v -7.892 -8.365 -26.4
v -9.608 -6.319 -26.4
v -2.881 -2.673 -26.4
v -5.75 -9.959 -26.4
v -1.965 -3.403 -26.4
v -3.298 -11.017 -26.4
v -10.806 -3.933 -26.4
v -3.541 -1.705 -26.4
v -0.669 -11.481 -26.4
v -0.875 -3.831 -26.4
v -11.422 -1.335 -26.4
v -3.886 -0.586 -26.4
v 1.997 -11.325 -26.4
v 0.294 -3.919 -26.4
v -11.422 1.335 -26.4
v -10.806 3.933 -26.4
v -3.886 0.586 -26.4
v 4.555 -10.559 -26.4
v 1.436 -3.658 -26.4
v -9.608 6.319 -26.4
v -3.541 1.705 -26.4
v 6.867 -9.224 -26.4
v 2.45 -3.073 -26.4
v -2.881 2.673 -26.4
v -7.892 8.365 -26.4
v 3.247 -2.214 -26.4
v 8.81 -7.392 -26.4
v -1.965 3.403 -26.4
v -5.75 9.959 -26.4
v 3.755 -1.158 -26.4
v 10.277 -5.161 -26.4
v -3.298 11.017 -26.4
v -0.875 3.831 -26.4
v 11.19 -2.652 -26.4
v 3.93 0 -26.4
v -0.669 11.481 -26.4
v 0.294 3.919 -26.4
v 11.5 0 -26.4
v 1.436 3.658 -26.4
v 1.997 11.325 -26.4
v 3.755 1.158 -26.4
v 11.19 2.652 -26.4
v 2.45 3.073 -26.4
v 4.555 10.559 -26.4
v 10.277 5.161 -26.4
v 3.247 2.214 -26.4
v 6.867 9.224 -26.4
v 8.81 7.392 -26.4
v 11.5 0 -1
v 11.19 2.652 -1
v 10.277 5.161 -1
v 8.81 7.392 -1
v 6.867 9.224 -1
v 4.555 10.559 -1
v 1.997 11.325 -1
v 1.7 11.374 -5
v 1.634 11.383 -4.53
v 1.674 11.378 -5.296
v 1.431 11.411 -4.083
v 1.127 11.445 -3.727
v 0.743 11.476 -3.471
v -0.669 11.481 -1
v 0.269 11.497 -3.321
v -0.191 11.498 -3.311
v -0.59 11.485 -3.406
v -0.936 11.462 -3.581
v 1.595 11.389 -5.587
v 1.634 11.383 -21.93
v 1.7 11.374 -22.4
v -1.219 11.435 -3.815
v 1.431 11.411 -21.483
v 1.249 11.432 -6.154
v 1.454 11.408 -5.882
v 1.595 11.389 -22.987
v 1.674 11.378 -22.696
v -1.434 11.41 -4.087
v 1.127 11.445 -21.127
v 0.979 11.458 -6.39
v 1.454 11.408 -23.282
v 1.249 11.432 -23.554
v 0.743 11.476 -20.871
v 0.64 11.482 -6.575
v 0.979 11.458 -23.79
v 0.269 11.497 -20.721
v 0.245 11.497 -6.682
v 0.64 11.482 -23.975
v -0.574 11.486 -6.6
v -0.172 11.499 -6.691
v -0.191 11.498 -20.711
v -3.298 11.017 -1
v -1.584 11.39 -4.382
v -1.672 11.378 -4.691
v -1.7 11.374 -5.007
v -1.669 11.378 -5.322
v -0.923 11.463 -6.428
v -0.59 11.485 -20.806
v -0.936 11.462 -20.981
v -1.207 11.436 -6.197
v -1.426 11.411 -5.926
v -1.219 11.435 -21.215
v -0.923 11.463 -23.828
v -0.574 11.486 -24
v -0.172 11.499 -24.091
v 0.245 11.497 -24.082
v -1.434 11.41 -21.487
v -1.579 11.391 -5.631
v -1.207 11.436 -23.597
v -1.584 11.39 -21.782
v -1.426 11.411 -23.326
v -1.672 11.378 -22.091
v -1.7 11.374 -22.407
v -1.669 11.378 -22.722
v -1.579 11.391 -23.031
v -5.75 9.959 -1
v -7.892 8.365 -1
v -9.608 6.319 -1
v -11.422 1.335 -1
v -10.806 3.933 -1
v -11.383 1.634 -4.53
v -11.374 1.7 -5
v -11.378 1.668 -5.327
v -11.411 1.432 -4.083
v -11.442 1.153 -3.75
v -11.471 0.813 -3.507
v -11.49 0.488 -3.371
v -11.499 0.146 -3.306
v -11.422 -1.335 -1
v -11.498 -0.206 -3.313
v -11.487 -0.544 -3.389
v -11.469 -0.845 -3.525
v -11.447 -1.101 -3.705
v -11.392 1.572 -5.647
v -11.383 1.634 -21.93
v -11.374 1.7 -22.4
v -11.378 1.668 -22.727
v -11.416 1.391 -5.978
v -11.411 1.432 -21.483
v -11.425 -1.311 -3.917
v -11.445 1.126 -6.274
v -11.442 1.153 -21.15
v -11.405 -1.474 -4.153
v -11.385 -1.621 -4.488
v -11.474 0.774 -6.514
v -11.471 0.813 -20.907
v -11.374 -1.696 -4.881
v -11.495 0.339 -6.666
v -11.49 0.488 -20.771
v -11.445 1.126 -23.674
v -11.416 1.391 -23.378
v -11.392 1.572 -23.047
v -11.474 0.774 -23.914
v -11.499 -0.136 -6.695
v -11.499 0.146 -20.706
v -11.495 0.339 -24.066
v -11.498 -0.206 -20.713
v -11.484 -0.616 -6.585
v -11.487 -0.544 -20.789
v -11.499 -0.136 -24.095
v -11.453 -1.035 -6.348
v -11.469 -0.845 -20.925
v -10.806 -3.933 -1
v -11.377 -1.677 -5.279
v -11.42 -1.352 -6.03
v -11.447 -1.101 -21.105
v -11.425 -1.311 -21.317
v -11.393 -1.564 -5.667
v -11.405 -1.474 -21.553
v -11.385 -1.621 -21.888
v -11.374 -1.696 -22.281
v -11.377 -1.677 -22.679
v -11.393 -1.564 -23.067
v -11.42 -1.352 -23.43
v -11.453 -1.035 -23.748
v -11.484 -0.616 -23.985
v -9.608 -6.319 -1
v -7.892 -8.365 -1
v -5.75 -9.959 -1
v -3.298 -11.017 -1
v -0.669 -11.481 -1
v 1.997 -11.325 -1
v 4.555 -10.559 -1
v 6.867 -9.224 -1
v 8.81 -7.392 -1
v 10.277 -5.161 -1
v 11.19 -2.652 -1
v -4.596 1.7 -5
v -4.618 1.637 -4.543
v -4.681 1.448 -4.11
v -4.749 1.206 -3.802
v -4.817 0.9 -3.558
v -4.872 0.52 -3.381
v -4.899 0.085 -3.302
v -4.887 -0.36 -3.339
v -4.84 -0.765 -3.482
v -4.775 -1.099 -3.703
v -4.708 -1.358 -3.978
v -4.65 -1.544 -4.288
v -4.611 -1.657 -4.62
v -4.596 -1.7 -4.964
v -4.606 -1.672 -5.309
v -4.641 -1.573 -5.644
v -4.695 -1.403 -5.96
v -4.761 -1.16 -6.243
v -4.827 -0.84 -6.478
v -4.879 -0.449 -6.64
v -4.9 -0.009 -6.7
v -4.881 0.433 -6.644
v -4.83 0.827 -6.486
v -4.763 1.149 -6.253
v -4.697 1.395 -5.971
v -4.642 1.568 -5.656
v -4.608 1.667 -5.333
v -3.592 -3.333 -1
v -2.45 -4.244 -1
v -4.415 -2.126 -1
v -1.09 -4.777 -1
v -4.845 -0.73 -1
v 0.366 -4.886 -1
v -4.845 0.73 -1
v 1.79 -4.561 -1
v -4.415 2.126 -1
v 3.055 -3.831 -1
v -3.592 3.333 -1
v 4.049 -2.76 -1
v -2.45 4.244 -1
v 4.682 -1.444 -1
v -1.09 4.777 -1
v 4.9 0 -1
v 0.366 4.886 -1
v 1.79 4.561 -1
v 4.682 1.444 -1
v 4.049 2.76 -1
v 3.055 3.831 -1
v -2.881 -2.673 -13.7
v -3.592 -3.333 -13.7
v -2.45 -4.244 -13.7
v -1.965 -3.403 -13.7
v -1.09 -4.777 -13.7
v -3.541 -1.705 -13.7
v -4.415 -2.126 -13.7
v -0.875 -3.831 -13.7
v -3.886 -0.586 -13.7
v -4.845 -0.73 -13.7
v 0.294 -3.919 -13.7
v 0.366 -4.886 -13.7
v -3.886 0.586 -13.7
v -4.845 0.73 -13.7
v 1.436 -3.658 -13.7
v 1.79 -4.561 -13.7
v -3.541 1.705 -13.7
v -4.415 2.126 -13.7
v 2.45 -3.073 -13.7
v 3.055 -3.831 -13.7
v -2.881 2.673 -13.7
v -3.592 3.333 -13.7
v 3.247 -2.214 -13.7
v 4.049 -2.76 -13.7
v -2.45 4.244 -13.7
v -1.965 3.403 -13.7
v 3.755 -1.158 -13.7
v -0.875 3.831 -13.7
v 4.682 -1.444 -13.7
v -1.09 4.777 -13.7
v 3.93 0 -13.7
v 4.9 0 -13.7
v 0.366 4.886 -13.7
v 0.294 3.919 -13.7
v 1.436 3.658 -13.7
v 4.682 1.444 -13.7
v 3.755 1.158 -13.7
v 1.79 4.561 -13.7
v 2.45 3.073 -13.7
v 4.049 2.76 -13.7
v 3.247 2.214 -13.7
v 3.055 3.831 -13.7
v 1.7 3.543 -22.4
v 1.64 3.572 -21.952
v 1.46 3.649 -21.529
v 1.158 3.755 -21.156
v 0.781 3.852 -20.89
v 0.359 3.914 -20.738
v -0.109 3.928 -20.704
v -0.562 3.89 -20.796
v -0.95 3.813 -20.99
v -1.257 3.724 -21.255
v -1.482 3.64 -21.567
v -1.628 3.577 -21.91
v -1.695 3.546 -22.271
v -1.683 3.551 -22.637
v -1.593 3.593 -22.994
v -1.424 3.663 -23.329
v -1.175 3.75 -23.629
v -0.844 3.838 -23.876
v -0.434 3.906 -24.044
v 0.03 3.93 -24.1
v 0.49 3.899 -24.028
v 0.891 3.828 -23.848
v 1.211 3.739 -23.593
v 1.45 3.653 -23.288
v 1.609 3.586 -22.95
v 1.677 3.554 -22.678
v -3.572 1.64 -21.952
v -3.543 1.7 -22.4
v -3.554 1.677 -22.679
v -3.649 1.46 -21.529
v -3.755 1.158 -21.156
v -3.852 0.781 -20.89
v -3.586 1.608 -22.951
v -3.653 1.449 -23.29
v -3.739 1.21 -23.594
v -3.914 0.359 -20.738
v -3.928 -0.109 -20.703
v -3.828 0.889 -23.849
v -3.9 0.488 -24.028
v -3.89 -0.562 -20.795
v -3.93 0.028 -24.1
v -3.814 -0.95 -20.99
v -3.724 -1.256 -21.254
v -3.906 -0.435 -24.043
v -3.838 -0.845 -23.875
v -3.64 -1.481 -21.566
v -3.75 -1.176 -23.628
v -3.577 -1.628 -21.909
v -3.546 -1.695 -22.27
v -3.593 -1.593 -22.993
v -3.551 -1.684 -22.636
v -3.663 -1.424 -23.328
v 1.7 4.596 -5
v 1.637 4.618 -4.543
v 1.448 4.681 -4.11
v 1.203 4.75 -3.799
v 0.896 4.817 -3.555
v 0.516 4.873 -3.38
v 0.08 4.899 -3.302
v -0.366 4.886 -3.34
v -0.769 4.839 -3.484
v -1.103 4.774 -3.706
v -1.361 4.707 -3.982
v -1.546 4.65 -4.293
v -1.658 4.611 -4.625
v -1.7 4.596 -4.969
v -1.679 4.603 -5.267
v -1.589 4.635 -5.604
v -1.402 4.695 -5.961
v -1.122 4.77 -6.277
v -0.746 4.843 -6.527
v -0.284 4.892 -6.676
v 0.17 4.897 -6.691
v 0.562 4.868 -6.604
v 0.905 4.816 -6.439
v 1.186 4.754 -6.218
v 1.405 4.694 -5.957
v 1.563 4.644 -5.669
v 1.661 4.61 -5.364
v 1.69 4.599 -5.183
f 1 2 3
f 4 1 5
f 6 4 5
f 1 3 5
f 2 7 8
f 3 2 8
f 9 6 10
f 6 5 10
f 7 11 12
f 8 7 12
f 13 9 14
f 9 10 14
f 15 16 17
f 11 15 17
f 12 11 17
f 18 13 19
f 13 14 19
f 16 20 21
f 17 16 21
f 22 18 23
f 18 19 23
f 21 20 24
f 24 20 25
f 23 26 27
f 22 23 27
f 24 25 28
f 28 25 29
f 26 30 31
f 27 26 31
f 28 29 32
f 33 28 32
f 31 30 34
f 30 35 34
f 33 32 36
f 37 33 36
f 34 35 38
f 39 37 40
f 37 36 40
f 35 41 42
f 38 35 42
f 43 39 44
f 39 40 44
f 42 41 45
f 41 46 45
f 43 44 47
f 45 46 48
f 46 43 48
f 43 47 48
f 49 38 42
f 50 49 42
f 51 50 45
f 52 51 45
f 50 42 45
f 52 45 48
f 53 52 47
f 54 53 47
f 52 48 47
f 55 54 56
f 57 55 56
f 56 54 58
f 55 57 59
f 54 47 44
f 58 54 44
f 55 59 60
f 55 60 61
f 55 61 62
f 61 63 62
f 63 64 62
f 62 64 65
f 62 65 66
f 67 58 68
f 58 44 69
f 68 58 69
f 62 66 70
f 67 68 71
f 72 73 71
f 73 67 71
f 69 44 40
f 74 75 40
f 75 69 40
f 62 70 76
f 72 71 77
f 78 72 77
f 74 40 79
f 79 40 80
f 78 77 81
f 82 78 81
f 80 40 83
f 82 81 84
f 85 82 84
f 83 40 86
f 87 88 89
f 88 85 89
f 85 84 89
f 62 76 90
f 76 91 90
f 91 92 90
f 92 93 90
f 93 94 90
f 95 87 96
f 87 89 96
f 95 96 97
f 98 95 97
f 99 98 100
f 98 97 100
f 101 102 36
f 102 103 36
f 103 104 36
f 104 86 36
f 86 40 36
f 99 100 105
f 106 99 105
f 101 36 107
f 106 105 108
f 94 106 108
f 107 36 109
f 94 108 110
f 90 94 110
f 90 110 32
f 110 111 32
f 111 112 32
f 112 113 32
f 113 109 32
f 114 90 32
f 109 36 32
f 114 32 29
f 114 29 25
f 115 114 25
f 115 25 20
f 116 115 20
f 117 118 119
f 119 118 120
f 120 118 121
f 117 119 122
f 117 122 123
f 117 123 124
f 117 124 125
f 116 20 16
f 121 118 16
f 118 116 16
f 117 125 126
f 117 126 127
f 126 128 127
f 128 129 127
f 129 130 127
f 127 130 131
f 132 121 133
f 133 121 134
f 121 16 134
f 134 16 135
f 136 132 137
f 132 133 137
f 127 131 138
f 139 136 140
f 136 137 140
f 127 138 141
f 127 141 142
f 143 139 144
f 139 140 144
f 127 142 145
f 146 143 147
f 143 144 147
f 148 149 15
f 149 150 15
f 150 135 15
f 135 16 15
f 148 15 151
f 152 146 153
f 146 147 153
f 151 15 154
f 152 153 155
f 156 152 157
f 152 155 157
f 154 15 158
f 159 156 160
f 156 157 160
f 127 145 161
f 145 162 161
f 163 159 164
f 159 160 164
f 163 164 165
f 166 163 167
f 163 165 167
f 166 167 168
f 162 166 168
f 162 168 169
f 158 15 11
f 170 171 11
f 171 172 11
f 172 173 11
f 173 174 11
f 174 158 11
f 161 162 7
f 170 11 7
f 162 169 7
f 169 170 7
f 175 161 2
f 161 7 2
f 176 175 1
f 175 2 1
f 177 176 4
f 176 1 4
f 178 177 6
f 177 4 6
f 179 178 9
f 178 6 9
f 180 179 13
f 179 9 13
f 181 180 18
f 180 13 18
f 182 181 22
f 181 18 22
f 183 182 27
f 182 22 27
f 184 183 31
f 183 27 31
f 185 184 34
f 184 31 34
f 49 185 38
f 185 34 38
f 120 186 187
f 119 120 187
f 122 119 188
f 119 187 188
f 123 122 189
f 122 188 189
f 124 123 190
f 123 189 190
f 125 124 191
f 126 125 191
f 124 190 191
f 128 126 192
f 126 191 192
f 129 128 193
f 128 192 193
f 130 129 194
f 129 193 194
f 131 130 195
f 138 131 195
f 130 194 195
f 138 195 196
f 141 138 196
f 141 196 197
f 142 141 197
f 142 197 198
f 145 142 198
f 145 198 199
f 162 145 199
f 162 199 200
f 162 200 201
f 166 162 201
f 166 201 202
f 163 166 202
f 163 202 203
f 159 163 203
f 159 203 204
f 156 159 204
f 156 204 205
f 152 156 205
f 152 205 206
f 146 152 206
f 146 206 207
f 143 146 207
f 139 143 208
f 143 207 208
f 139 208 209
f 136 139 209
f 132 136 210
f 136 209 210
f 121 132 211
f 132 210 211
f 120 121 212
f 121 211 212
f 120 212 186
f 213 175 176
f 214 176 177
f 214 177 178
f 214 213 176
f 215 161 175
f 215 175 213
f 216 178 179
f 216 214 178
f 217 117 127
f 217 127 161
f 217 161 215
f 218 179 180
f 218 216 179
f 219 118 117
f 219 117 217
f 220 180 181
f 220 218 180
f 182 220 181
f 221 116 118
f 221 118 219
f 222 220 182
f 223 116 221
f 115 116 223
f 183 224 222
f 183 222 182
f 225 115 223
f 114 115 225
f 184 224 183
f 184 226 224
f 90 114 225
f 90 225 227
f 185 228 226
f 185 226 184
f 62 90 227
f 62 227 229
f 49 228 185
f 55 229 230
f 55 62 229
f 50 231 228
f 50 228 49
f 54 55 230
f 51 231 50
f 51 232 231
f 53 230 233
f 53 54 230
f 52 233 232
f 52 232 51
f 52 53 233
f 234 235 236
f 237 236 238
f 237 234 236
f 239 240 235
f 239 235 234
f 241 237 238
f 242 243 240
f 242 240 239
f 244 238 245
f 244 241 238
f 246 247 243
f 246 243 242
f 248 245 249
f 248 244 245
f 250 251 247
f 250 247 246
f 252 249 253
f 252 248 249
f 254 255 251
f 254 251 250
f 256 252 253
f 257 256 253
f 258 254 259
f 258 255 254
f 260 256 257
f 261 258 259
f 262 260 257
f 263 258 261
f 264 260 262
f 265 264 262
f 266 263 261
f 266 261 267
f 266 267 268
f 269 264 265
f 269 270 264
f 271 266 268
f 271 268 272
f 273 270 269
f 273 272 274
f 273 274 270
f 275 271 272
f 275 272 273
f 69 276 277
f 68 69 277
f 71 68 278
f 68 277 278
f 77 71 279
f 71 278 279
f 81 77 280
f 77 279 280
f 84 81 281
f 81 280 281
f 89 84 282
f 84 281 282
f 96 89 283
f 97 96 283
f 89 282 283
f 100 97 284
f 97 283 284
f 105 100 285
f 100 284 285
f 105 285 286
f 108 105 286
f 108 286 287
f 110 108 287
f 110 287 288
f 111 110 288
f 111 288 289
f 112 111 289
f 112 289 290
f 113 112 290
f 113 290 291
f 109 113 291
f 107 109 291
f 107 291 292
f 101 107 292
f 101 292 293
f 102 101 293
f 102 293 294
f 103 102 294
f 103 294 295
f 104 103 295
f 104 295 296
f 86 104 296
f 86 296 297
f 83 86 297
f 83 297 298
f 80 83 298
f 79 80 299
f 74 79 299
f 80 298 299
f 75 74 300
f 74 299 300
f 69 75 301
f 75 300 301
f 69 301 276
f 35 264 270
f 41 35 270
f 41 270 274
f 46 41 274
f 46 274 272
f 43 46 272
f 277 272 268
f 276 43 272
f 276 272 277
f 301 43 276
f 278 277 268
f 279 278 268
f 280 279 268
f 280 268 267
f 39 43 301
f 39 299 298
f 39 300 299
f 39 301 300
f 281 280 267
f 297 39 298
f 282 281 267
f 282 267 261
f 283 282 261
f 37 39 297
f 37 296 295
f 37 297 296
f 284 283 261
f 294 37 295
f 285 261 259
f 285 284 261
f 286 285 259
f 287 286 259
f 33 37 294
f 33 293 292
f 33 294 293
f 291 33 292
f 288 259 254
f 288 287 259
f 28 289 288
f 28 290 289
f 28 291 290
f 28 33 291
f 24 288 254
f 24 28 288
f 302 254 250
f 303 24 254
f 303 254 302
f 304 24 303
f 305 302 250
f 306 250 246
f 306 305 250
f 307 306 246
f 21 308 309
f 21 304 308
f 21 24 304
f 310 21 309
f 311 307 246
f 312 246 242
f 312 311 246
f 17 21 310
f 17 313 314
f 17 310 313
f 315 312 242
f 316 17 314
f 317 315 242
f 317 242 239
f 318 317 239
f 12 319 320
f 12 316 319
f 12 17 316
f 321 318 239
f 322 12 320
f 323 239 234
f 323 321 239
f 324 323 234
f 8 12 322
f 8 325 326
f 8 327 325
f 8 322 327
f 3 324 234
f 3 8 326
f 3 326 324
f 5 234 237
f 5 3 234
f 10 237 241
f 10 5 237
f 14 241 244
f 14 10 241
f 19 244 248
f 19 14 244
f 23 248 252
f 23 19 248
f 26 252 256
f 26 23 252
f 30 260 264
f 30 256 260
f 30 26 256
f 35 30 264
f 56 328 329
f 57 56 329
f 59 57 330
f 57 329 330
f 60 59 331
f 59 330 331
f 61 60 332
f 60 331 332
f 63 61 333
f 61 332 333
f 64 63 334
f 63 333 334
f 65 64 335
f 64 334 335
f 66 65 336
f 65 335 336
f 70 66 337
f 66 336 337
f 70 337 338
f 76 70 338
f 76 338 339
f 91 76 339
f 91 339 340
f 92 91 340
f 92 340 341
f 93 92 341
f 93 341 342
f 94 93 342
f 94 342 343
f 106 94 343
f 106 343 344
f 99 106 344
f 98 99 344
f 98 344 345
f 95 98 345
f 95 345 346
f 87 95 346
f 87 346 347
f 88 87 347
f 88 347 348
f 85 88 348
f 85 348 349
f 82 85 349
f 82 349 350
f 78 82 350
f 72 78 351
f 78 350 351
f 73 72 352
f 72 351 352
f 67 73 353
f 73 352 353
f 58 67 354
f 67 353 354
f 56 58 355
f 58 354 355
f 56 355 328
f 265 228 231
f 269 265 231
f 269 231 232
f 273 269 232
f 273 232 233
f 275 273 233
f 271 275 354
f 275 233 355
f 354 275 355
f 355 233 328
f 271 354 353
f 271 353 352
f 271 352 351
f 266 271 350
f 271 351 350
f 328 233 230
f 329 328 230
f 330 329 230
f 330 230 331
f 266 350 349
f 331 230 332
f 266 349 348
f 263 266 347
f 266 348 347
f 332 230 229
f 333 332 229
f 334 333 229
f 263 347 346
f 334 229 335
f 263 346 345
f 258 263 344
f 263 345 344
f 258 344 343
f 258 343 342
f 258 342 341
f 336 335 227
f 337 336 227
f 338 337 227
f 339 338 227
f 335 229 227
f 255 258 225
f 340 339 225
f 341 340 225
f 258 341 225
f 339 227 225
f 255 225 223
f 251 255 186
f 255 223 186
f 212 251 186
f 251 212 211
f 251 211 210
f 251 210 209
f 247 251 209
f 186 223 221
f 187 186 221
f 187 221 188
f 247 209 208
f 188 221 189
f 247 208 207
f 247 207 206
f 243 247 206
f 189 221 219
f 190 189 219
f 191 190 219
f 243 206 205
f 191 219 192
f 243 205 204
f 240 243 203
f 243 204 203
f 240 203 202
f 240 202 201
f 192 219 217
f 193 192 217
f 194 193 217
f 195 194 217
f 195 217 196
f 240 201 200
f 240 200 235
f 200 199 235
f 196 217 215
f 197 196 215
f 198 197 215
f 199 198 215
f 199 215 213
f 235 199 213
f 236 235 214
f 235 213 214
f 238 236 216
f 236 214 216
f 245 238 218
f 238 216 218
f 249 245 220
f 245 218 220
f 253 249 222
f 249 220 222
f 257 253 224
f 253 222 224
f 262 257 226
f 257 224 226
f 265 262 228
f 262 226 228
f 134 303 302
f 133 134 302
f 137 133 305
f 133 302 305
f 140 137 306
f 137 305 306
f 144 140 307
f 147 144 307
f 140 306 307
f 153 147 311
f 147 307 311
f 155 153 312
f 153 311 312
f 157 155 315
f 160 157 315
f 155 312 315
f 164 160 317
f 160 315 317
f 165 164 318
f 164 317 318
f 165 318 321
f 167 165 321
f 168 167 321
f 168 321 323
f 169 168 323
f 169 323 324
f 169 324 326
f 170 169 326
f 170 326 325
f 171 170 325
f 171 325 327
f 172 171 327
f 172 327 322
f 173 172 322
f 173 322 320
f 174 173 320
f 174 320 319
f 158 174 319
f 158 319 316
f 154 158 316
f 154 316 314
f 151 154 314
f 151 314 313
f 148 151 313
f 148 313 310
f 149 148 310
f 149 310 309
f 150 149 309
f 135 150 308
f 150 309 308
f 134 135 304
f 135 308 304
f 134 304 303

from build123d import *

# Parameters (mm, degrees)
SKETCH_R        = 11.5
SKETCH_R_2      = 3.93
PAD_DEPTH       = 25.4
SKETCH001_R     = 4.9
POCKET_DEPTH    = 12.7
SKETCH002_R     = 1.7
POCKET001_DEPTH = 11.501
SKETCH003_R     = 1.7
POCKET002_DEPTH = 11.501


with BuildPart() as part:
    # Sketch → Pad (new body)
    with BuildSketch(Plane.XY):
        Circle(SKETCH_R)
        Circle(SKETCH_R_2, mode=Mode.SUBTRACT)
    extrude(amount=PAD_DEPTH)

    # Sketch001 (on Face4 of Pad) → Pocket (cut)
    with BuildSketch(Plane.XY.offset(25.4)):
        Circle(SKETCH001_R)
    extrude(amount=-POCKET_DEPTH, mode=Mode.SUBTRACT)

    # Sketch002 → Pocket001 (cut, through all)
    with BuildSketch(Plane.XZ):
        with Locations((0, 4)):
            Circle(SKETCH002_R)
        with Locations((0, 21.4)):
            Circle(SKETCH002_R)
    extrude(amount=-POCKET001_DEPTH, mode=Mode.SUBTRACT)

    # Sketch003 → Pocket002 (cut, through all)
    with BuildSketch(Plane.YZ):
        with Locations((0, 4)):
            Circle(SKETCH003_R)
        with Locations((0, 21.4)):
            Circle(SKETCH003_R)
    extrude(amount=-POCKET002_DEPTH, mode=Mode.SUBTRACT)


with BuildPart() as part_1:
    # Clone placement: moved
    add(part.part.moved(Location((0, 0, -26.4))))


solid = part_1.part
